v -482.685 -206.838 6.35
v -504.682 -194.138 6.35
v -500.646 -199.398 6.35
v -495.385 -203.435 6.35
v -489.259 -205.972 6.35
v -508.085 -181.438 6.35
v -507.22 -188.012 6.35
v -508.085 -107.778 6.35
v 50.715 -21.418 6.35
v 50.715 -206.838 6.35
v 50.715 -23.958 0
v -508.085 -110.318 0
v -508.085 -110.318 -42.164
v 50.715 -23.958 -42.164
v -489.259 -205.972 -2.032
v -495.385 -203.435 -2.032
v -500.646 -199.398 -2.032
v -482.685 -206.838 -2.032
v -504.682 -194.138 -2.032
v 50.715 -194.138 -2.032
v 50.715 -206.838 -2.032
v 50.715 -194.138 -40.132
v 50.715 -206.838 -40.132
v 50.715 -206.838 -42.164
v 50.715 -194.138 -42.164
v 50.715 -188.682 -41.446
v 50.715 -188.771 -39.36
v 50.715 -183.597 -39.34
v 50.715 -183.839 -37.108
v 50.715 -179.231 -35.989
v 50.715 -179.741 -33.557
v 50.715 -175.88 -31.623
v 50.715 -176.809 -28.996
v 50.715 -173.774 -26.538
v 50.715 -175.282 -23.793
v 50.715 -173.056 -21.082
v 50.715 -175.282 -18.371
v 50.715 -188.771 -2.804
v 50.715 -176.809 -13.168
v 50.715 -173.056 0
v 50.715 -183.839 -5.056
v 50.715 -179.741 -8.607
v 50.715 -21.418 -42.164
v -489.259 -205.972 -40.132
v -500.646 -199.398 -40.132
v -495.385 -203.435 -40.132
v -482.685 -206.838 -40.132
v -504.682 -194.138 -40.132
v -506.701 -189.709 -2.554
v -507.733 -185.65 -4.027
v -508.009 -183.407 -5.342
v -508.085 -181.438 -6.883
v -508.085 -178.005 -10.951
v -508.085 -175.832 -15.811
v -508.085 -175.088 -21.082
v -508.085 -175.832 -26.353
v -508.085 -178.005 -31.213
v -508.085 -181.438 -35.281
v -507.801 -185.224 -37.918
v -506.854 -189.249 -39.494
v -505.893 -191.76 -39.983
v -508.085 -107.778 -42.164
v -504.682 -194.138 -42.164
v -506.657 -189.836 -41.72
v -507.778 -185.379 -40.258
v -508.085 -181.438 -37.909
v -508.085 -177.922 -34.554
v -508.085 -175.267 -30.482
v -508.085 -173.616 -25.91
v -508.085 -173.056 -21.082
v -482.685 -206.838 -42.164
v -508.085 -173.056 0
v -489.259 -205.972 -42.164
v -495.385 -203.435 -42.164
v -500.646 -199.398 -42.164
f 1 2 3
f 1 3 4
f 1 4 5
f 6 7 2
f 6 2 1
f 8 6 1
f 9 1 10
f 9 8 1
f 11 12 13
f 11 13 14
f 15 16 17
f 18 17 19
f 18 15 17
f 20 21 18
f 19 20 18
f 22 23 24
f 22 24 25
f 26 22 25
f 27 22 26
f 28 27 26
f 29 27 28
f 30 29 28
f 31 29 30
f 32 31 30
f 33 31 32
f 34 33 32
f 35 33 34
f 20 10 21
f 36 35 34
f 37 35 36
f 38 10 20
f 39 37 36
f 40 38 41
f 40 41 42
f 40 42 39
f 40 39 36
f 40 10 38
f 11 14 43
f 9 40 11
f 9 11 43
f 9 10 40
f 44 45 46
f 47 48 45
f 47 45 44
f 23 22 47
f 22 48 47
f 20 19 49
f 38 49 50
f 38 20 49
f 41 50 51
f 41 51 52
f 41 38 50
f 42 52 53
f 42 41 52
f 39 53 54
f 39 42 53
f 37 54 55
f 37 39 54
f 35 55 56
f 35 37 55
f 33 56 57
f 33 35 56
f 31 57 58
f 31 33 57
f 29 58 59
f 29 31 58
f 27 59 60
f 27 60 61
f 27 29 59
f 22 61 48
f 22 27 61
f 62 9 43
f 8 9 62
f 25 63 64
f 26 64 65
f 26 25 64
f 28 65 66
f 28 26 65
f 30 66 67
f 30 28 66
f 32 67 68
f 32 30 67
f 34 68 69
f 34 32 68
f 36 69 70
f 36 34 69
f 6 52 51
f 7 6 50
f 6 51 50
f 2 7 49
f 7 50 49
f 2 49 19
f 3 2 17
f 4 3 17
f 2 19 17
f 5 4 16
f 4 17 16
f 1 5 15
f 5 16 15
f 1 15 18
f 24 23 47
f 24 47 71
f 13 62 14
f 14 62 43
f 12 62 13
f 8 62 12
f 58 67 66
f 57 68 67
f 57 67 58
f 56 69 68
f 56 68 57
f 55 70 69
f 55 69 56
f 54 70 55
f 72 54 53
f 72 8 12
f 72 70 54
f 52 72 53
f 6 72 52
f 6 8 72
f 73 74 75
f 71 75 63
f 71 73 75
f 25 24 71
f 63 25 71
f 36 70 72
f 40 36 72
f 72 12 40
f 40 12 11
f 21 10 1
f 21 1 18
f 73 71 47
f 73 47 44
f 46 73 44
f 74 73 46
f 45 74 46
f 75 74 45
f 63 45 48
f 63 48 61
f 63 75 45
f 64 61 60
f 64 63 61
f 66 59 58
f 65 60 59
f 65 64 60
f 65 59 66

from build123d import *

# Parameters (mm, degrees)
BOSS_EXTRUDE1_DEPTH = 6.35
BOSS_EXTRUDE2_DEPTH = 558.8
CUT_EXTRUDE1_START  = -93.726
CUT_EXTRUDE1_DEPTH  = 93.726
CUT_EXTRUDE2_DEPTH  = 93.726
BOSS_EXTRUDE3_DEPTH = 42.164


with BuildPart() as part:
    # Sketch1 → Boss-Extrude1 (new body)
    with BuildSketch(Plane.XY):
        with BuildLine():
            Line((-508.085110878, -46.817945662), (-508.085110878, -168.737945662))
            Line((-508.085110878, -168.737945662), (-508.085110878, -181.437945662))
            ThreePointArc((-508.085110878, -181.437945662), (-500.64562312, -199.398457904), (-482.685110878, -206.837945662))
            Line((-482.685110878, -206.837945662), (50.714889122, -206.837945662))
            Line((50.714889122, -206.837945662), (50.714889122, -21.417945662))
            Line((50.714889122, -21.417945662), (-482.685110878, -21.417945662))
            ThreePointArc((-482.685110878, -21.417945662), (-500.64562312, -28.85743342), (-508.085110878, -46.817945662))
        make_face()
    extrude(amount=BOSS_EXTRUDE1_DEPTH)

    # Sketch2 → Boss-Extrude2 (add, through all)
    with BuildSketch(Plane(origin=(50.714889122, 0, 0), x_dir=(0, 0, -1), z_dir=(1, 0, 0))):
        with BuildLine():
            Line((0, -173.055945662), (0, -206.837945662))
            Line((0, -206.837945662), (2.032, -206.837945662))
            Line((2.032, -206.837945662), (2.032, -194.137945662))
            ThreePointArc((2.032, -194.137945662), (21.082, -175.087945662), (40.132, -194.137945662))
            Line((40.132, -194.137945662), (40.132, -206.837945662))
            Line((40.132, -206.837945662), (42.164, -206.837945662))
            Line((42.164, -206.837945662), (42.164, -194.137945662))
            ThreePointArc((42.164, -194.137945662), (35.989225161, -179.230720501), (21.082, -173.055945662))
            Line((21.082, -173.055945662), (0, -173.055945662))
        make_face()
    extrude(amount=-BOSS_EXTRUDE2_DEPTH)

    # Sketch3 → Cut-Extrude1 (cut)
    with BuildSketch(Plane.XY.offset(CUT_EXTRUDE1_START)):
        with BuildLine():
            Line((-508.085110878, -206.837945662), (-482.685110878, -206.837945662))
            ThreePointArc((-482.685110878, -206.837945662), (-500.64562312, -199.398457904), (-508.085110878, -181.437945662))
            Line((-508.085110878, -181.437945662), (-508.085110878, -206.837945662))
        make_face()
    extrude(amount=CUT_EXTRUDE1_DEPTH, mode=Mode.SUBTRACT)

    # Sketch4 → Cut-Extrude2 (cut)
    with BuildSketch(Plane(origin=(0, 0, 0), x_dir=(-1, 0, 0), z_dir=(0, 0, -1))):
        with BuildLine():
            Line((482.685110878, -21.417945662), (-50.714889122, -21.417945662))
            Line((-50.714889122, -21.417945662), (508.085110878, -107.777945662))
            Line((508.085110878, -107.777945662), (508.085110878, -46.817945662))
            ThreePointArc((508.085110878, -46.817945662), (500.64562312, -28.85743342), (482.685110878, -21.417945662))
        make_face()
    extrude(amount=-CUT_EXTRUDE2_DEPTH, mode=Mode.SUBTRACT)

    # Sketch5 → Boss-Extrude3 (add, through all)
    with BuildSketch(Plane(origin=(0, 0, 0), x_dir=(-1, 0, 0), z_dir=(0, 0, -1))):
        Polygon((-50.714889122, -21.417945662), (508.085110878, -107.777945662), (508.085110878, -110.317945662), (-50.714889122, -23.957945662), align=None)
    extrude(amount=BOSS_EXTRUDE3_DEPTH)


solid = part.part
